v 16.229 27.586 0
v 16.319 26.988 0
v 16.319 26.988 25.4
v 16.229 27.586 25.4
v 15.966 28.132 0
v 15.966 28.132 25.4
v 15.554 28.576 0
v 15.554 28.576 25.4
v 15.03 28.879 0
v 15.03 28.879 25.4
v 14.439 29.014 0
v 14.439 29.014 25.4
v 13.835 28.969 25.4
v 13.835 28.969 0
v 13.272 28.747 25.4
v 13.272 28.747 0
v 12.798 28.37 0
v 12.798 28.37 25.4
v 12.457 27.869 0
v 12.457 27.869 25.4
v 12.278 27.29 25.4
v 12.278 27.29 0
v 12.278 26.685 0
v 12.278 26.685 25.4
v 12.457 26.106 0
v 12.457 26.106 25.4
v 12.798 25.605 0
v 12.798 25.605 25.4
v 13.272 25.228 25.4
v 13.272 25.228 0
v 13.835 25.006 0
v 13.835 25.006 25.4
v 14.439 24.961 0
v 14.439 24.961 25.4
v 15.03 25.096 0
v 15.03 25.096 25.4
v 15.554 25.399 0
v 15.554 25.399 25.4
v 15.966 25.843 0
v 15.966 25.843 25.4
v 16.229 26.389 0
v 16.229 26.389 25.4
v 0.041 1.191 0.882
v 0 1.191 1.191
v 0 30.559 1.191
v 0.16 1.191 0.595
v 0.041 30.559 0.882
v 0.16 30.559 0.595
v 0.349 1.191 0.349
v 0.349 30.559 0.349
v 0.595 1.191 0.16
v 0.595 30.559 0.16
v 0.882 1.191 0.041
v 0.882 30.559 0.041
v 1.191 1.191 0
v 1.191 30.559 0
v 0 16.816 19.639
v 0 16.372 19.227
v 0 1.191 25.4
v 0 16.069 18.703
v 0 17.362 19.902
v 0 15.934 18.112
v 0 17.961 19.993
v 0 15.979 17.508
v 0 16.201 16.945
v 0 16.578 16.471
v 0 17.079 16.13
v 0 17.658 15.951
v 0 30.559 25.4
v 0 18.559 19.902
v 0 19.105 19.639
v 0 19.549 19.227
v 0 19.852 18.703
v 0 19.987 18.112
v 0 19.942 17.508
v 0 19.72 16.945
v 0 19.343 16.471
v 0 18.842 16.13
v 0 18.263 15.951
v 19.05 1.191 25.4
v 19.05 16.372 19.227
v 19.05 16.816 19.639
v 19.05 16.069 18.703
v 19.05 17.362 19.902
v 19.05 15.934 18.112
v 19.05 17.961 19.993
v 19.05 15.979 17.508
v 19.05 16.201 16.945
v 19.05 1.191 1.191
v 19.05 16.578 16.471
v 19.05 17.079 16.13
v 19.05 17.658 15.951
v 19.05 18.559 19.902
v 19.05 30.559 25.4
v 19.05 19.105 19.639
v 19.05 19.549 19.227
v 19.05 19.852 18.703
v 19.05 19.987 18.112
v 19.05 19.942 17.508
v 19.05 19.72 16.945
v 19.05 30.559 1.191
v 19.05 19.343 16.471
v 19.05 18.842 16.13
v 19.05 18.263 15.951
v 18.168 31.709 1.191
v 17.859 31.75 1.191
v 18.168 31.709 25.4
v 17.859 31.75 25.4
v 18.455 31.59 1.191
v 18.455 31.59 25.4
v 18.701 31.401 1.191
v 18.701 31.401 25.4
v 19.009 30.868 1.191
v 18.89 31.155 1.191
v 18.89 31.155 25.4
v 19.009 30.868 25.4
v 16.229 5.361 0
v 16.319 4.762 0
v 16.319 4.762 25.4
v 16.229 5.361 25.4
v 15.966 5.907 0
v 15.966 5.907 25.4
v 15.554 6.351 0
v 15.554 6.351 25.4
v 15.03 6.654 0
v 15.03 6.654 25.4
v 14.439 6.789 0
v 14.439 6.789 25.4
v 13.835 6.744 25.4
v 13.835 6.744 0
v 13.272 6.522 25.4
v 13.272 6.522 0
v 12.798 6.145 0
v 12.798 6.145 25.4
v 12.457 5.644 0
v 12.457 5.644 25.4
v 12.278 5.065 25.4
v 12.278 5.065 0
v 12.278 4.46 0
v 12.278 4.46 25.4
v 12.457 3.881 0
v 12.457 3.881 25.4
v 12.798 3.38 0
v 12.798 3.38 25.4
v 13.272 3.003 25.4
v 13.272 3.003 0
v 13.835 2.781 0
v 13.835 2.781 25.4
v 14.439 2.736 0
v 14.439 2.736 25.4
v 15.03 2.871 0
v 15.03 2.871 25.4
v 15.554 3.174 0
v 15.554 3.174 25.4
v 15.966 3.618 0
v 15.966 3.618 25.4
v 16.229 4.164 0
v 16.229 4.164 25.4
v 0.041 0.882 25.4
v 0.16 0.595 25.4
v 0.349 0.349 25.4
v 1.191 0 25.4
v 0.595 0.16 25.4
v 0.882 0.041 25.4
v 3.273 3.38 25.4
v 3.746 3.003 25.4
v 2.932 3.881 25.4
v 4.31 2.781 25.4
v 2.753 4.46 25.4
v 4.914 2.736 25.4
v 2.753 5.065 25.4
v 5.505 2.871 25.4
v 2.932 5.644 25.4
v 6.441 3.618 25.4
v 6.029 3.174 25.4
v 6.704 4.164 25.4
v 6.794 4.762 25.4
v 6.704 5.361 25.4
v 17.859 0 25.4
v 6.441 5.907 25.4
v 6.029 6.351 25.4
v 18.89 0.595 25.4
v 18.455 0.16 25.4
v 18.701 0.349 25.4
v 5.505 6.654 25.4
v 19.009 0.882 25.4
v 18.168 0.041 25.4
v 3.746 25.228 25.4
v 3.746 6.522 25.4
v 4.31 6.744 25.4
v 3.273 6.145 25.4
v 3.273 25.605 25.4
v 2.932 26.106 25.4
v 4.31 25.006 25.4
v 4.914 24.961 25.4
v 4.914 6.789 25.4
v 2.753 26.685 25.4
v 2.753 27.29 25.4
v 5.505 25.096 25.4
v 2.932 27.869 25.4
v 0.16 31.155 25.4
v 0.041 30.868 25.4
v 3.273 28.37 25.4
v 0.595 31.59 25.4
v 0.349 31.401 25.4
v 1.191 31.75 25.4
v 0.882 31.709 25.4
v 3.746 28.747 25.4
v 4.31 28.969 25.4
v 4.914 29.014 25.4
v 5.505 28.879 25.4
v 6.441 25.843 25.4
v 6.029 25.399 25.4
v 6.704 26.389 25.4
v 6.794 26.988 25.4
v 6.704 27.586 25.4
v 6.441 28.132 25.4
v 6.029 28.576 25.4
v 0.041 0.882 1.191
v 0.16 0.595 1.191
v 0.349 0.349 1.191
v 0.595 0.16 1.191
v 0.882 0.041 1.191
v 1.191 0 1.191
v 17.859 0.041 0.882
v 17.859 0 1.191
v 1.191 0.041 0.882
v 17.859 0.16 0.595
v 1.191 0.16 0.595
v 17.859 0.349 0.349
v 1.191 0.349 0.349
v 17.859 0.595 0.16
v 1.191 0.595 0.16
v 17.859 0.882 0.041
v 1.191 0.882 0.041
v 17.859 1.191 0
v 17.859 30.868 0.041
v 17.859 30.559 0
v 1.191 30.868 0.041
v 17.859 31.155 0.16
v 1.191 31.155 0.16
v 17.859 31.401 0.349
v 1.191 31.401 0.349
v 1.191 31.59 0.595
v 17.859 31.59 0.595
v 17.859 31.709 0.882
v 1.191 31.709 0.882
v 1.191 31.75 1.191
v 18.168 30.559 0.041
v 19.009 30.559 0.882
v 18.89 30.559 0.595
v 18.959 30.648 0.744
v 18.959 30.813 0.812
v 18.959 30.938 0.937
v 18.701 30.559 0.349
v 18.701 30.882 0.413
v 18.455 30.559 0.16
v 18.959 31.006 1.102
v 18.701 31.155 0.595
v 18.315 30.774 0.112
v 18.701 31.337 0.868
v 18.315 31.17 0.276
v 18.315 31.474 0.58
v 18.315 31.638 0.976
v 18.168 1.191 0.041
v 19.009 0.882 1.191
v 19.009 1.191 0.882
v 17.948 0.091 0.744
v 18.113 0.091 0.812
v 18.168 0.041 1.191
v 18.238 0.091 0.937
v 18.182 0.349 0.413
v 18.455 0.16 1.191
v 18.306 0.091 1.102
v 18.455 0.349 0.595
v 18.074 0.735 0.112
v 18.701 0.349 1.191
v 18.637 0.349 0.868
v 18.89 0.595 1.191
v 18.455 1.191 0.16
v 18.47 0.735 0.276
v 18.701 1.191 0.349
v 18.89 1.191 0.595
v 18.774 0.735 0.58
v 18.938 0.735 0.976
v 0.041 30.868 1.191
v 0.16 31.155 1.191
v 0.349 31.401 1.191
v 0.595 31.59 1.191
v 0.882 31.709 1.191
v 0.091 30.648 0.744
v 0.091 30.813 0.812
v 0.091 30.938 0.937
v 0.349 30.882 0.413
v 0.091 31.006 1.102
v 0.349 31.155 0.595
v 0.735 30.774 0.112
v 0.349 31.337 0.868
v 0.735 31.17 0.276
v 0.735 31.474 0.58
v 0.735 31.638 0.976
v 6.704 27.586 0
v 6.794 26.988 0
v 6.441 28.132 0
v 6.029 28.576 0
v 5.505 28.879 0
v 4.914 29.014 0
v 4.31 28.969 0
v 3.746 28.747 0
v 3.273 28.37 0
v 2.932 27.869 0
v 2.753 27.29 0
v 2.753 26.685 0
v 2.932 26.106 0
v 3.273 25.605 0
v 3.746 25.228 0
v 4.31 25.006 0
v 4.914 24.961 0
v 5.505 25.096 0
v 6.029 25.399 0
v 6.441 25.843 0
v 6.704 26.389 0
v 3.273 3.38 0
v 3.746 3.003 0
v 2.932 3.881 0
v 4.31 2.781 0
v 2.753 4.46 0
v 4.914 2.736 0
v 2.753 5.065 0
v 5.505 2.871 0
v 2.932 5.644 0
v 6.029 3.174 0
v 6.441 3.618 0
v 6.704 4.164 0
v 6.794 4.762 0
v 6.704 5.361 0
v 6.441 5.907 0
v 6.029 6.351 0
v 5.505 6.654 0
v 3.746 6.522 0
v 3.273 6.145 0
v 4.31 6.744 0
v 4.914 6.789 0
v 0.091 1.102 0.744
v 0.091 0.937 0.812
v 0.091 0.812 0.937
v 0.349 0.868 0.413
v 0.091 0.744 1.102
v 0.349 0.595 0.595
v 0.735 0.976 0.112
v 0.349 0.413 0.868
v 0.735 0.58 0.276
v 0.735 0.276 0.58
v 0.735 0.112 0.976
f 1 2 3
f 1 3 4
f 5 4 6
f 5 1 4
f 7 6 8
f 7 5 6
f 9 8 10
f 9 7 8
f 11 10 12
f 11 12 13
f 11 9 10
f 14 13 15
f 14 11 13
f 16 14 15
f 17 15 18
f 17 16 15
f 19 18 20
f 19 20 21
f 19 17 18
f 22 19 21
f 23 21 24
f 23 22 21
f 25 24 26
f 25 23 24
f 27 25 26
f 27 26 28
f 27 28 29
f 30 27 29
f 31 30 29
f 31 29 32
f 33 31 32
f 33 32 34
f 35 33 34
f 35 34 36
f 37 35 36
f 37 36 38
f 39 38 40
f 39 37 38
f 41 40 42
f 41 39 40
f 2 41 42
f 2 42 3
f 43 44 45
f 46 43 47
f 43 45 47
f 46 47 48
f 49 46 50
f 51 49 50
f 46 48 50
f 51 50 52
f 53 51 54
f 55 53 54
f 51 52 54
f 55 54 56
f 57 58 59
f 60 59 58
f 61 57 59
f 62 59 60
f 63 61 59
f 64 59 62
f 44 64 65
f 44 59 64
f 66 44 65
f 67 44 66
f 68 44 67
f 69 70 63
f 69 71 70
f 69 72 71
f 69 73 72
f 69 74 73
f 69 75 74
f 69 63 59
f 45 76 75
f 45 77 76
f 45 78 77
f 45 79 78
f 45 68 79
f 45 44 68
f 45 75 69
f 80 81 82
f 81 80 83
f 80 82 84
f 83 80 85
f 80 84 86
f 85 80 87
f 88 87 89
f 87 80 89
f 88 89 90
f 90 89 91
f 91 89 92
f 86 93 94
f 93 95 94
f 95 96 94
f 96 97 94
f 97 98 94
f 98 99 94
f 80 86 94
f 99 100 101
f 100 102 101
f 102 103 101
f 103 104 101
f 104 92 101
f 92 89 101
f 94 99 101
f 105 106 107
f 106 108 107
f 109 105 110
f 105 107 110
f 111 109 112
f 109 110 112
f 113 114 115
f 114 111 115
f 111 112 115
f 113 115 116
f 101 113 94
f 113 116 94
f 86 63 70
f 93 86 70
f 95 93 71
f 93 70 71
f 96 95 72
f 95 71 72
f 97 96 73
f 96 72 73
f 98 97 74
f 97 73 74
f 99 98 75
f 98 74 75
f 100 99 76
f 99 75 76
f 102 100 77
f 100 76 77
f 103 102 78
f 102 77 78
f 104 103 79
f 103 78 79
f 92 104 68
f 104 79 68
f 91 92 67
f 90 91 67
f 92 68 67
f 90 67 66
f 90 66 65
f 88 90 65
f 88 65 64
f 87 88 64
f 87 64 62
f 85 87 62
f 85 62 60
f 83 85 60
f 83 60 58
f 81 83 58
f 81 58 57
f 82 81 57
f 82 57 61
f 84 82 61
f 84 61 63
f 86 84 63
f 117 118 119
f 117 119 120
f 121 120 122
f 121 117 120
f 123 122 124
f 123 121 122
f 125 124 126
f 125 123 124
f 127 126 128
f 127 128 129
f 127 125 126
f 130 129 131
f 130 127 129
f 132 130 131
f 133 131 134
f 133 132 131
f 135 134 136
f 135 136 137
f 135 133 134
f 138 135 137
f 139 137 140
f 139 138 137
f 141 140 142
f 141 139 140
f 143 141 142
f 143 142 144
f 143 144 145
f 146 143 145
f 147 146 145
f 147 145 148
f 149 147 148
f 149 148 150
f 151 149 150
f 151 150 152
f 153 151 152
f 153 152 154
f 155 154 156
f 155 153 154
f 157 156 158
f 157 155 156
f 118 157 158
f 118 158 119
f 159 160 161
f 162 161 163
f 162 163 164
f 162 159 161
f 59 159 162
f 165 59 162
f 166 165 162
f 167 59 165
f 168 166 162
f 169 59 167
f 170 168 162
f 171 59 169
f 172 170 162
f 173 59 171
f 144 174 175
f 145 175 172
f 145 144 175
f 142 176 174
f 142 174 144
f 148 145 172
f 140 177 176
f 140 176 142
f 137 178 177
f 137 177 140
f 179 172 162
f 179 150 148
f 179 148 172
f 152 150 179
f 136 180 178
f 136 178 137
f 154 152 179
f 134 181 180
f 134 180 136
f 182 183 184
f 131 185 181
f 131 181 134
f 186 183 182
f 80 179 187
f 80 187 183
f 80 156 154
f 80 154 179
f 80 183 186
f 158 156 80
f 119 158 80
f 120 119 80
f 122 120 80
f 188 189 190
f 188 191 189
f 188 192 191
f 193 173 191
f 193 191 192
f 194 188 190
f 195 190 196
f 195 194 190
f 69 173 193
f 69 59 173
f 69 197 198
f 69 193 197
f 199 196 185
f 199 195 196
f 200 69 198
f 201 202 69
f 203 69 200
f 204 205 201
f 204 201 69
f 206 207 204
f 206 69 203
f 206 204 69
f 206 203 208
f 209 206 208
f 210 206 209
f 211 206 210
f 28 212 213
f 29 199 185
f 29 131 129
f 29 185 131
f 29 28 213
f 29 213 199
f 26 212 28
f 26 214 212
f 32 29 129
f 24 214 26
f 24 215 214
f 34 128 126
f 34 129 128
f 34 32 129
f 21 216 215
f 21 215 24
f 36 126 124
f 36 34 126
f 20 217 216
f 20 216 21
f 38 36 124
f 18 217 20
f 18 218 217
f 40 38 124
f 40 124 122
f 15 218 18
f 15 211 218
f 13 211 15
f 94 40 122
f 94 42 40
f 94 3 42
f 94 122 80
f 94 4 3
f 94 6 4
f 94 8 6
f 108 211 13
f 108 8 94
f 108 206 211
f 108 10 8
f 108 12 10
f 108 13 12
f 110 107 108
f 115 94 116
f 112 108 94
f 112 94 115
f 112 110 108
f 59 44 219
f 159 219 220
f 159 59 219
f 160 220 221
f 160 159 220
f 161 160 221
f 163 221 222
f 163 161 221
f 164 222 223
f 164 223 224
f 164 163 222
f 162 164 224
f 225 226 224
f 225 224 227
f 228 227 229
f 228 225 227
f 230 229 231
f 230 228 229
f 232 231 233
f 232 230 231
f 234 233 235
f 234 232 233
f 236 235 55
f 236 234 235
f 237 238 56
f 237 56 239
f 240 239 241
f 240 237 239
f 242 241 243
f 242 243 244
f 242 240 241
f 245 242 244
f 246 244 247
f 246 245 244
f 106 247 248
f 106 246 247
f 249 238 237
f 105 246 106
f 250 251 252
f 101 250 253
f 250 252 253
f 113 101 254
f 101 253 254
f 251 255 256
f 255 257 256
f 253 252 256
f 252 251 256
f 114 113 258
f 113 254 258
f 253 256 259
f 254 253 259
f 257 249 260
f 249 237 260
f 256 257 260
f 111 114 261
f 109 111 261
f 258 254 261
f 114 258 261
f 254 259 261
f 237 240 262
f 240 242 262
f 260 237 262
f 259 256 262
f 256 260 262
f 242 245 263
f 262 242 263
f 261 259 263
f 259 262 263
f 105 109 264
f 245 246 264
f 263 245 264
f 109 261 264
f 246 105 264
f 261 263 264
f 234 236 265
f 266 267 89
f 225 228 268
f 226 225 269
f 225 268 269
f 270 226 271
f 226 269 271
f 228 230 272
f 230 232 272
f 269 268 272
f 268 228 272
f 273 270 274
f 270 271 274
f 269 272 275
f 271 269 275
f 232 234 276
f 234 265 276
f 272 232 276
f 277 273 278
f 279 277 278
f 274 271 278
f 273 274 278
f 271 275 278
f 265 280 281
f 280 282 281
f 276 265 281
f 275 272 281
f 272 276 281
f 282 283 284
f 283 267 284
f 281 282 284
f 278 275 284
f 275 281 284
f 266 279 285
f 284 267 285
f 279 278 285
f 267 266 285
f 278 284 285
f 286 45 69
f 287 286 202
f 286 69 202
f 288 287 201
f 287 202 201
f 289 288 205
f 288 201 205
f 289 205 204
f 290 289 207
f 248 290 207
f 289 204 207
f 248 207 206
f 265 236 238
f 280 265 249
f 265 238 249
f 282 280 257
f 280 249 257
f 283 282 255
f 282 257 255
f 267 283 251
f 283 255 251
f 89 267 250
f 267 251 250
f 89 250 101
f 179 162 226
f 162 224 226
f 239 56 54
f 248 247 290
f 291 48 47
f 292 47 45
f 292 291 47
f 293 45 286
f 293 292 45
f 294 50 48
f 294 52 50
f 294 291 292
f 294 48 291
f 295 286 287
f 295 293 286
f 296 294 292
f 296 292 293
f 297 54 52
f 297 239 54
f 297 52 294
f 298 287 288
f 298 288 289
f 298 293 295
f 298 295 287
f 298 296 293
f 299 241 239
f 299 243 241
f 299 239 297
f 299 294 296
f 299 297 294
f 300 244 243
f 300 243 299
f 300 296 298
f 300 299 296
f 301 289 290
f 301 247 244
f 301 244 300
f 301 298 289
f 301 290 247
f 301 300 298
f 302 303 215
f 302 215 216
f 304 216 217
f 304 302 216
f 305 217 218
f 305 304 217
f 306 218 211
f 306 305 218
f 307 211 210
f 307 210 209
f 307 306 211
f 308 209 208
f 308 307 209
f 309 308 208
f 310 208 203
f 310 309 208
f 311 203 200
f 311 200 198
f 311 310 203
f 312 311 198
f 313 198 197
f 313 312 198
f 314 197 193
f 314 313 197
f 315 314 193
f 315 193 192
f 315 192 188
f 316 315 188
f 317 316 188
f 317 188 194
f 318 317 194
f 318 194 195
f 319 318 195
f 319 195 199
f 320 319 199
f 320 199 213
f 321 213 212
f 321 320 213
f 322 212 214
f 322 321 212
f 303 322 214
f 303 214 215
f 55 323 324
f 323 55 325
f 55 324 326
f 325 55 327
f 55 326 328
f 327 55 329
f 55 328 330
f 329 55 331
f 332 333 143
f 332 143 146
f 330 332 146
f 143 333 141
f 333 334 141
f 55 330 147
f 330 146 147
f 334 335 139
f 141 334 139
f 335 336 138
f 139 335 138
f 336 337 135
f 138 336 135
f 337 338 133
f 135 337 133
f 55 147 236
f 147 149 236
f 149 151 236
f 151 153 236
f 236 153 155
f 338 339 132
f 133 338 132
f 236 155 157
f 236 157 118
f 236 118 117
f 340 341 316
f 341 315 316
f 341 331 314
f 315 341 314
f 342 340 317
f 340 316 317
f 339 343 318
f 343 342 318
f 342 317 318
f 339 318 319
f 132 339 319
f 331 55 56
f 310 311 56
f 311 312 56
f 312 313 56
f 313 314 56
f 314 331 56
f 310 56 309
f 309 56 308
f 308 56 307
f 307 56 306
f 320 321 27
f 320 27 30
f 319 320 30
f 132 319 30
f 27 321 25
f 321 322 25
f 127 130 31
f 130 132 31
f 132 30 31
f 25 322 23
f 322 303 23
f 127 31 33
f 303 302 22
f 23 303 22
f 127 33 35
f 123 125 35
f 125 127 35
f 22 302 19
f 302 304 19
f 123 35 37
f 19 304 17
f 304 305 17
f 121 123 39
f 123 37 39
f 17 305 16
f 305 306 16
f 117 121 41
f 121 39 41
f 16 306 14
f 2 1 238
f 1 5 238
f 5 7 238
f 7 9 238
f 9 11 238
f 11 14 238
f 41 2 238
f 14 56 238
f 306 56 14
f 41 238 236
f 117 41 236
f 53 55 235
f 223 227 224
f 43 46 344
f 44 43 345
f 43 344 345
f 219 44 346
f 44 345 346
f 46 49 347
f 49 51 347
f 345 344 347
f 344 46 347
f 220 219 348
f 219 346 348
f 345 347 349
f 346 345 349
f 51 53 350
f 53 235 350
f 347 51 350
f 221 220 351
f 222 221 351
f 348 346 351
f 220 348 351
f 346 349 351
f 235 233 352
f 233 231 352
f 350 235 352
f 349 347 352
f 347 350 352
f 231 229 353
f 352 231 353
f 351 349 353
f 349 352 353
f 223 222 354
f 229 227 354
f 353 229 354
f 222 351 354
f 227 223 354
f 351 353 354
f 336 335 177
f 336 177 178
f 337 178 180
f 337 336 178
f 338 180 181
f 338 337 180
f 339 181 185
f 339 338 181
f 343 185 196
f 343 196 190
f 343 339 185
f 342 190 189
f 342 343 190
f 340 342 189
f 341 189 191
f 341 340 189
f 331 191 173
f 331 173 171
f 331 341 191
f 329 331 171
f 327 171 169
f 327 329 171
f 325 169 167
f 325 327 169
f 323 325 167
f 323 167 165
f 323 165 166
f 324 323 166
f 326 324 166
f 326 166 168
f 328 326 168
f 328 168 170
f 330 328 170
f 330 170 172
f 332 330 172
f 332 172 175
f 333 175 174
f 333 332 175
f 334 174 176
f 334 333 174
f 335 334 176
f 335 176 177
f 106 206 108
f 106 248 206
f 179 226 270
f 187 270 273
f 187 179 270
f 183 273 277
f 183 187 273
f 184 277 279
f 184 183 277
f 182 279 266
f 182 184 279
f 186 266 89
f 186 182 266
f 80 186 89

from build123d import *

# Parameters (mm, degrees)
SKETCH1_W           = 19.05
SKETCH1_H           = 31.75
SKETCH1_R           = 2.032
BOSS_EXTRUDE1_DEPTH = 25.4
SKETCH2_R           = 2.032
CUT_EXTRUDE1_DEPTH  = 45.901280605
FILLET1_R           = 1.190625


with BuildPart() as part:
    # Sketch1 → Boss-Extrude1 (new body)
    with BuildSketch(Plane.XY):
        with Locations((9.525, 15.875)):
            Rectangle(SKETCH1_W, SKETCH1_H)
        with Locations((4.7625, 26.9875)):
            Circle(SKETCH1_R, mode=Mode.SUBTRACT)
        with Locations((14.2875, 26.9875)):
            Circle(SKETCH1_R, mode=Mode.SUBTRACT)
        with Locations((4.7625, 4.7625)):
            Circle(SKETCH1_R, mode=Mode.SUBTRACT)
        with Locations((14.2875, 4.7625)):
            Circle(SKETCH1_R, mode=Mode.SUBTRACT)
    extrude(amount=BOSS_EXTRUDE1_DEPTH)

    # Sketch2 → Cut-Extrude1 (cut, through all)
    with BuildSketch(Plane.ZY):
        with Locations((17.960512242, 17.960512242)):
            Circle(SKETCH2_R)
    extrude(amount=-CUT_EXTRUDE1_DEPTH, mode=Mode.SUBTRACT)

    # Fillet1
    fillet1_edges = [part.edges().sort_by_distance(p)[0] for p in [
        (9.525, 31.75, 0),
        (19.05, 15.875, 0),
        (9.525, 0, 0),
        (0, 15.875, 0),
        (0, 31.75, 12.7),
        (19.05, 31.75, 12.7),
        (19.05, 0, 12.7),
        (0, 0, 12.7),
    ]]
    fillet(fillet1_edges, radius=FILLET1_R)


solid = part.part
